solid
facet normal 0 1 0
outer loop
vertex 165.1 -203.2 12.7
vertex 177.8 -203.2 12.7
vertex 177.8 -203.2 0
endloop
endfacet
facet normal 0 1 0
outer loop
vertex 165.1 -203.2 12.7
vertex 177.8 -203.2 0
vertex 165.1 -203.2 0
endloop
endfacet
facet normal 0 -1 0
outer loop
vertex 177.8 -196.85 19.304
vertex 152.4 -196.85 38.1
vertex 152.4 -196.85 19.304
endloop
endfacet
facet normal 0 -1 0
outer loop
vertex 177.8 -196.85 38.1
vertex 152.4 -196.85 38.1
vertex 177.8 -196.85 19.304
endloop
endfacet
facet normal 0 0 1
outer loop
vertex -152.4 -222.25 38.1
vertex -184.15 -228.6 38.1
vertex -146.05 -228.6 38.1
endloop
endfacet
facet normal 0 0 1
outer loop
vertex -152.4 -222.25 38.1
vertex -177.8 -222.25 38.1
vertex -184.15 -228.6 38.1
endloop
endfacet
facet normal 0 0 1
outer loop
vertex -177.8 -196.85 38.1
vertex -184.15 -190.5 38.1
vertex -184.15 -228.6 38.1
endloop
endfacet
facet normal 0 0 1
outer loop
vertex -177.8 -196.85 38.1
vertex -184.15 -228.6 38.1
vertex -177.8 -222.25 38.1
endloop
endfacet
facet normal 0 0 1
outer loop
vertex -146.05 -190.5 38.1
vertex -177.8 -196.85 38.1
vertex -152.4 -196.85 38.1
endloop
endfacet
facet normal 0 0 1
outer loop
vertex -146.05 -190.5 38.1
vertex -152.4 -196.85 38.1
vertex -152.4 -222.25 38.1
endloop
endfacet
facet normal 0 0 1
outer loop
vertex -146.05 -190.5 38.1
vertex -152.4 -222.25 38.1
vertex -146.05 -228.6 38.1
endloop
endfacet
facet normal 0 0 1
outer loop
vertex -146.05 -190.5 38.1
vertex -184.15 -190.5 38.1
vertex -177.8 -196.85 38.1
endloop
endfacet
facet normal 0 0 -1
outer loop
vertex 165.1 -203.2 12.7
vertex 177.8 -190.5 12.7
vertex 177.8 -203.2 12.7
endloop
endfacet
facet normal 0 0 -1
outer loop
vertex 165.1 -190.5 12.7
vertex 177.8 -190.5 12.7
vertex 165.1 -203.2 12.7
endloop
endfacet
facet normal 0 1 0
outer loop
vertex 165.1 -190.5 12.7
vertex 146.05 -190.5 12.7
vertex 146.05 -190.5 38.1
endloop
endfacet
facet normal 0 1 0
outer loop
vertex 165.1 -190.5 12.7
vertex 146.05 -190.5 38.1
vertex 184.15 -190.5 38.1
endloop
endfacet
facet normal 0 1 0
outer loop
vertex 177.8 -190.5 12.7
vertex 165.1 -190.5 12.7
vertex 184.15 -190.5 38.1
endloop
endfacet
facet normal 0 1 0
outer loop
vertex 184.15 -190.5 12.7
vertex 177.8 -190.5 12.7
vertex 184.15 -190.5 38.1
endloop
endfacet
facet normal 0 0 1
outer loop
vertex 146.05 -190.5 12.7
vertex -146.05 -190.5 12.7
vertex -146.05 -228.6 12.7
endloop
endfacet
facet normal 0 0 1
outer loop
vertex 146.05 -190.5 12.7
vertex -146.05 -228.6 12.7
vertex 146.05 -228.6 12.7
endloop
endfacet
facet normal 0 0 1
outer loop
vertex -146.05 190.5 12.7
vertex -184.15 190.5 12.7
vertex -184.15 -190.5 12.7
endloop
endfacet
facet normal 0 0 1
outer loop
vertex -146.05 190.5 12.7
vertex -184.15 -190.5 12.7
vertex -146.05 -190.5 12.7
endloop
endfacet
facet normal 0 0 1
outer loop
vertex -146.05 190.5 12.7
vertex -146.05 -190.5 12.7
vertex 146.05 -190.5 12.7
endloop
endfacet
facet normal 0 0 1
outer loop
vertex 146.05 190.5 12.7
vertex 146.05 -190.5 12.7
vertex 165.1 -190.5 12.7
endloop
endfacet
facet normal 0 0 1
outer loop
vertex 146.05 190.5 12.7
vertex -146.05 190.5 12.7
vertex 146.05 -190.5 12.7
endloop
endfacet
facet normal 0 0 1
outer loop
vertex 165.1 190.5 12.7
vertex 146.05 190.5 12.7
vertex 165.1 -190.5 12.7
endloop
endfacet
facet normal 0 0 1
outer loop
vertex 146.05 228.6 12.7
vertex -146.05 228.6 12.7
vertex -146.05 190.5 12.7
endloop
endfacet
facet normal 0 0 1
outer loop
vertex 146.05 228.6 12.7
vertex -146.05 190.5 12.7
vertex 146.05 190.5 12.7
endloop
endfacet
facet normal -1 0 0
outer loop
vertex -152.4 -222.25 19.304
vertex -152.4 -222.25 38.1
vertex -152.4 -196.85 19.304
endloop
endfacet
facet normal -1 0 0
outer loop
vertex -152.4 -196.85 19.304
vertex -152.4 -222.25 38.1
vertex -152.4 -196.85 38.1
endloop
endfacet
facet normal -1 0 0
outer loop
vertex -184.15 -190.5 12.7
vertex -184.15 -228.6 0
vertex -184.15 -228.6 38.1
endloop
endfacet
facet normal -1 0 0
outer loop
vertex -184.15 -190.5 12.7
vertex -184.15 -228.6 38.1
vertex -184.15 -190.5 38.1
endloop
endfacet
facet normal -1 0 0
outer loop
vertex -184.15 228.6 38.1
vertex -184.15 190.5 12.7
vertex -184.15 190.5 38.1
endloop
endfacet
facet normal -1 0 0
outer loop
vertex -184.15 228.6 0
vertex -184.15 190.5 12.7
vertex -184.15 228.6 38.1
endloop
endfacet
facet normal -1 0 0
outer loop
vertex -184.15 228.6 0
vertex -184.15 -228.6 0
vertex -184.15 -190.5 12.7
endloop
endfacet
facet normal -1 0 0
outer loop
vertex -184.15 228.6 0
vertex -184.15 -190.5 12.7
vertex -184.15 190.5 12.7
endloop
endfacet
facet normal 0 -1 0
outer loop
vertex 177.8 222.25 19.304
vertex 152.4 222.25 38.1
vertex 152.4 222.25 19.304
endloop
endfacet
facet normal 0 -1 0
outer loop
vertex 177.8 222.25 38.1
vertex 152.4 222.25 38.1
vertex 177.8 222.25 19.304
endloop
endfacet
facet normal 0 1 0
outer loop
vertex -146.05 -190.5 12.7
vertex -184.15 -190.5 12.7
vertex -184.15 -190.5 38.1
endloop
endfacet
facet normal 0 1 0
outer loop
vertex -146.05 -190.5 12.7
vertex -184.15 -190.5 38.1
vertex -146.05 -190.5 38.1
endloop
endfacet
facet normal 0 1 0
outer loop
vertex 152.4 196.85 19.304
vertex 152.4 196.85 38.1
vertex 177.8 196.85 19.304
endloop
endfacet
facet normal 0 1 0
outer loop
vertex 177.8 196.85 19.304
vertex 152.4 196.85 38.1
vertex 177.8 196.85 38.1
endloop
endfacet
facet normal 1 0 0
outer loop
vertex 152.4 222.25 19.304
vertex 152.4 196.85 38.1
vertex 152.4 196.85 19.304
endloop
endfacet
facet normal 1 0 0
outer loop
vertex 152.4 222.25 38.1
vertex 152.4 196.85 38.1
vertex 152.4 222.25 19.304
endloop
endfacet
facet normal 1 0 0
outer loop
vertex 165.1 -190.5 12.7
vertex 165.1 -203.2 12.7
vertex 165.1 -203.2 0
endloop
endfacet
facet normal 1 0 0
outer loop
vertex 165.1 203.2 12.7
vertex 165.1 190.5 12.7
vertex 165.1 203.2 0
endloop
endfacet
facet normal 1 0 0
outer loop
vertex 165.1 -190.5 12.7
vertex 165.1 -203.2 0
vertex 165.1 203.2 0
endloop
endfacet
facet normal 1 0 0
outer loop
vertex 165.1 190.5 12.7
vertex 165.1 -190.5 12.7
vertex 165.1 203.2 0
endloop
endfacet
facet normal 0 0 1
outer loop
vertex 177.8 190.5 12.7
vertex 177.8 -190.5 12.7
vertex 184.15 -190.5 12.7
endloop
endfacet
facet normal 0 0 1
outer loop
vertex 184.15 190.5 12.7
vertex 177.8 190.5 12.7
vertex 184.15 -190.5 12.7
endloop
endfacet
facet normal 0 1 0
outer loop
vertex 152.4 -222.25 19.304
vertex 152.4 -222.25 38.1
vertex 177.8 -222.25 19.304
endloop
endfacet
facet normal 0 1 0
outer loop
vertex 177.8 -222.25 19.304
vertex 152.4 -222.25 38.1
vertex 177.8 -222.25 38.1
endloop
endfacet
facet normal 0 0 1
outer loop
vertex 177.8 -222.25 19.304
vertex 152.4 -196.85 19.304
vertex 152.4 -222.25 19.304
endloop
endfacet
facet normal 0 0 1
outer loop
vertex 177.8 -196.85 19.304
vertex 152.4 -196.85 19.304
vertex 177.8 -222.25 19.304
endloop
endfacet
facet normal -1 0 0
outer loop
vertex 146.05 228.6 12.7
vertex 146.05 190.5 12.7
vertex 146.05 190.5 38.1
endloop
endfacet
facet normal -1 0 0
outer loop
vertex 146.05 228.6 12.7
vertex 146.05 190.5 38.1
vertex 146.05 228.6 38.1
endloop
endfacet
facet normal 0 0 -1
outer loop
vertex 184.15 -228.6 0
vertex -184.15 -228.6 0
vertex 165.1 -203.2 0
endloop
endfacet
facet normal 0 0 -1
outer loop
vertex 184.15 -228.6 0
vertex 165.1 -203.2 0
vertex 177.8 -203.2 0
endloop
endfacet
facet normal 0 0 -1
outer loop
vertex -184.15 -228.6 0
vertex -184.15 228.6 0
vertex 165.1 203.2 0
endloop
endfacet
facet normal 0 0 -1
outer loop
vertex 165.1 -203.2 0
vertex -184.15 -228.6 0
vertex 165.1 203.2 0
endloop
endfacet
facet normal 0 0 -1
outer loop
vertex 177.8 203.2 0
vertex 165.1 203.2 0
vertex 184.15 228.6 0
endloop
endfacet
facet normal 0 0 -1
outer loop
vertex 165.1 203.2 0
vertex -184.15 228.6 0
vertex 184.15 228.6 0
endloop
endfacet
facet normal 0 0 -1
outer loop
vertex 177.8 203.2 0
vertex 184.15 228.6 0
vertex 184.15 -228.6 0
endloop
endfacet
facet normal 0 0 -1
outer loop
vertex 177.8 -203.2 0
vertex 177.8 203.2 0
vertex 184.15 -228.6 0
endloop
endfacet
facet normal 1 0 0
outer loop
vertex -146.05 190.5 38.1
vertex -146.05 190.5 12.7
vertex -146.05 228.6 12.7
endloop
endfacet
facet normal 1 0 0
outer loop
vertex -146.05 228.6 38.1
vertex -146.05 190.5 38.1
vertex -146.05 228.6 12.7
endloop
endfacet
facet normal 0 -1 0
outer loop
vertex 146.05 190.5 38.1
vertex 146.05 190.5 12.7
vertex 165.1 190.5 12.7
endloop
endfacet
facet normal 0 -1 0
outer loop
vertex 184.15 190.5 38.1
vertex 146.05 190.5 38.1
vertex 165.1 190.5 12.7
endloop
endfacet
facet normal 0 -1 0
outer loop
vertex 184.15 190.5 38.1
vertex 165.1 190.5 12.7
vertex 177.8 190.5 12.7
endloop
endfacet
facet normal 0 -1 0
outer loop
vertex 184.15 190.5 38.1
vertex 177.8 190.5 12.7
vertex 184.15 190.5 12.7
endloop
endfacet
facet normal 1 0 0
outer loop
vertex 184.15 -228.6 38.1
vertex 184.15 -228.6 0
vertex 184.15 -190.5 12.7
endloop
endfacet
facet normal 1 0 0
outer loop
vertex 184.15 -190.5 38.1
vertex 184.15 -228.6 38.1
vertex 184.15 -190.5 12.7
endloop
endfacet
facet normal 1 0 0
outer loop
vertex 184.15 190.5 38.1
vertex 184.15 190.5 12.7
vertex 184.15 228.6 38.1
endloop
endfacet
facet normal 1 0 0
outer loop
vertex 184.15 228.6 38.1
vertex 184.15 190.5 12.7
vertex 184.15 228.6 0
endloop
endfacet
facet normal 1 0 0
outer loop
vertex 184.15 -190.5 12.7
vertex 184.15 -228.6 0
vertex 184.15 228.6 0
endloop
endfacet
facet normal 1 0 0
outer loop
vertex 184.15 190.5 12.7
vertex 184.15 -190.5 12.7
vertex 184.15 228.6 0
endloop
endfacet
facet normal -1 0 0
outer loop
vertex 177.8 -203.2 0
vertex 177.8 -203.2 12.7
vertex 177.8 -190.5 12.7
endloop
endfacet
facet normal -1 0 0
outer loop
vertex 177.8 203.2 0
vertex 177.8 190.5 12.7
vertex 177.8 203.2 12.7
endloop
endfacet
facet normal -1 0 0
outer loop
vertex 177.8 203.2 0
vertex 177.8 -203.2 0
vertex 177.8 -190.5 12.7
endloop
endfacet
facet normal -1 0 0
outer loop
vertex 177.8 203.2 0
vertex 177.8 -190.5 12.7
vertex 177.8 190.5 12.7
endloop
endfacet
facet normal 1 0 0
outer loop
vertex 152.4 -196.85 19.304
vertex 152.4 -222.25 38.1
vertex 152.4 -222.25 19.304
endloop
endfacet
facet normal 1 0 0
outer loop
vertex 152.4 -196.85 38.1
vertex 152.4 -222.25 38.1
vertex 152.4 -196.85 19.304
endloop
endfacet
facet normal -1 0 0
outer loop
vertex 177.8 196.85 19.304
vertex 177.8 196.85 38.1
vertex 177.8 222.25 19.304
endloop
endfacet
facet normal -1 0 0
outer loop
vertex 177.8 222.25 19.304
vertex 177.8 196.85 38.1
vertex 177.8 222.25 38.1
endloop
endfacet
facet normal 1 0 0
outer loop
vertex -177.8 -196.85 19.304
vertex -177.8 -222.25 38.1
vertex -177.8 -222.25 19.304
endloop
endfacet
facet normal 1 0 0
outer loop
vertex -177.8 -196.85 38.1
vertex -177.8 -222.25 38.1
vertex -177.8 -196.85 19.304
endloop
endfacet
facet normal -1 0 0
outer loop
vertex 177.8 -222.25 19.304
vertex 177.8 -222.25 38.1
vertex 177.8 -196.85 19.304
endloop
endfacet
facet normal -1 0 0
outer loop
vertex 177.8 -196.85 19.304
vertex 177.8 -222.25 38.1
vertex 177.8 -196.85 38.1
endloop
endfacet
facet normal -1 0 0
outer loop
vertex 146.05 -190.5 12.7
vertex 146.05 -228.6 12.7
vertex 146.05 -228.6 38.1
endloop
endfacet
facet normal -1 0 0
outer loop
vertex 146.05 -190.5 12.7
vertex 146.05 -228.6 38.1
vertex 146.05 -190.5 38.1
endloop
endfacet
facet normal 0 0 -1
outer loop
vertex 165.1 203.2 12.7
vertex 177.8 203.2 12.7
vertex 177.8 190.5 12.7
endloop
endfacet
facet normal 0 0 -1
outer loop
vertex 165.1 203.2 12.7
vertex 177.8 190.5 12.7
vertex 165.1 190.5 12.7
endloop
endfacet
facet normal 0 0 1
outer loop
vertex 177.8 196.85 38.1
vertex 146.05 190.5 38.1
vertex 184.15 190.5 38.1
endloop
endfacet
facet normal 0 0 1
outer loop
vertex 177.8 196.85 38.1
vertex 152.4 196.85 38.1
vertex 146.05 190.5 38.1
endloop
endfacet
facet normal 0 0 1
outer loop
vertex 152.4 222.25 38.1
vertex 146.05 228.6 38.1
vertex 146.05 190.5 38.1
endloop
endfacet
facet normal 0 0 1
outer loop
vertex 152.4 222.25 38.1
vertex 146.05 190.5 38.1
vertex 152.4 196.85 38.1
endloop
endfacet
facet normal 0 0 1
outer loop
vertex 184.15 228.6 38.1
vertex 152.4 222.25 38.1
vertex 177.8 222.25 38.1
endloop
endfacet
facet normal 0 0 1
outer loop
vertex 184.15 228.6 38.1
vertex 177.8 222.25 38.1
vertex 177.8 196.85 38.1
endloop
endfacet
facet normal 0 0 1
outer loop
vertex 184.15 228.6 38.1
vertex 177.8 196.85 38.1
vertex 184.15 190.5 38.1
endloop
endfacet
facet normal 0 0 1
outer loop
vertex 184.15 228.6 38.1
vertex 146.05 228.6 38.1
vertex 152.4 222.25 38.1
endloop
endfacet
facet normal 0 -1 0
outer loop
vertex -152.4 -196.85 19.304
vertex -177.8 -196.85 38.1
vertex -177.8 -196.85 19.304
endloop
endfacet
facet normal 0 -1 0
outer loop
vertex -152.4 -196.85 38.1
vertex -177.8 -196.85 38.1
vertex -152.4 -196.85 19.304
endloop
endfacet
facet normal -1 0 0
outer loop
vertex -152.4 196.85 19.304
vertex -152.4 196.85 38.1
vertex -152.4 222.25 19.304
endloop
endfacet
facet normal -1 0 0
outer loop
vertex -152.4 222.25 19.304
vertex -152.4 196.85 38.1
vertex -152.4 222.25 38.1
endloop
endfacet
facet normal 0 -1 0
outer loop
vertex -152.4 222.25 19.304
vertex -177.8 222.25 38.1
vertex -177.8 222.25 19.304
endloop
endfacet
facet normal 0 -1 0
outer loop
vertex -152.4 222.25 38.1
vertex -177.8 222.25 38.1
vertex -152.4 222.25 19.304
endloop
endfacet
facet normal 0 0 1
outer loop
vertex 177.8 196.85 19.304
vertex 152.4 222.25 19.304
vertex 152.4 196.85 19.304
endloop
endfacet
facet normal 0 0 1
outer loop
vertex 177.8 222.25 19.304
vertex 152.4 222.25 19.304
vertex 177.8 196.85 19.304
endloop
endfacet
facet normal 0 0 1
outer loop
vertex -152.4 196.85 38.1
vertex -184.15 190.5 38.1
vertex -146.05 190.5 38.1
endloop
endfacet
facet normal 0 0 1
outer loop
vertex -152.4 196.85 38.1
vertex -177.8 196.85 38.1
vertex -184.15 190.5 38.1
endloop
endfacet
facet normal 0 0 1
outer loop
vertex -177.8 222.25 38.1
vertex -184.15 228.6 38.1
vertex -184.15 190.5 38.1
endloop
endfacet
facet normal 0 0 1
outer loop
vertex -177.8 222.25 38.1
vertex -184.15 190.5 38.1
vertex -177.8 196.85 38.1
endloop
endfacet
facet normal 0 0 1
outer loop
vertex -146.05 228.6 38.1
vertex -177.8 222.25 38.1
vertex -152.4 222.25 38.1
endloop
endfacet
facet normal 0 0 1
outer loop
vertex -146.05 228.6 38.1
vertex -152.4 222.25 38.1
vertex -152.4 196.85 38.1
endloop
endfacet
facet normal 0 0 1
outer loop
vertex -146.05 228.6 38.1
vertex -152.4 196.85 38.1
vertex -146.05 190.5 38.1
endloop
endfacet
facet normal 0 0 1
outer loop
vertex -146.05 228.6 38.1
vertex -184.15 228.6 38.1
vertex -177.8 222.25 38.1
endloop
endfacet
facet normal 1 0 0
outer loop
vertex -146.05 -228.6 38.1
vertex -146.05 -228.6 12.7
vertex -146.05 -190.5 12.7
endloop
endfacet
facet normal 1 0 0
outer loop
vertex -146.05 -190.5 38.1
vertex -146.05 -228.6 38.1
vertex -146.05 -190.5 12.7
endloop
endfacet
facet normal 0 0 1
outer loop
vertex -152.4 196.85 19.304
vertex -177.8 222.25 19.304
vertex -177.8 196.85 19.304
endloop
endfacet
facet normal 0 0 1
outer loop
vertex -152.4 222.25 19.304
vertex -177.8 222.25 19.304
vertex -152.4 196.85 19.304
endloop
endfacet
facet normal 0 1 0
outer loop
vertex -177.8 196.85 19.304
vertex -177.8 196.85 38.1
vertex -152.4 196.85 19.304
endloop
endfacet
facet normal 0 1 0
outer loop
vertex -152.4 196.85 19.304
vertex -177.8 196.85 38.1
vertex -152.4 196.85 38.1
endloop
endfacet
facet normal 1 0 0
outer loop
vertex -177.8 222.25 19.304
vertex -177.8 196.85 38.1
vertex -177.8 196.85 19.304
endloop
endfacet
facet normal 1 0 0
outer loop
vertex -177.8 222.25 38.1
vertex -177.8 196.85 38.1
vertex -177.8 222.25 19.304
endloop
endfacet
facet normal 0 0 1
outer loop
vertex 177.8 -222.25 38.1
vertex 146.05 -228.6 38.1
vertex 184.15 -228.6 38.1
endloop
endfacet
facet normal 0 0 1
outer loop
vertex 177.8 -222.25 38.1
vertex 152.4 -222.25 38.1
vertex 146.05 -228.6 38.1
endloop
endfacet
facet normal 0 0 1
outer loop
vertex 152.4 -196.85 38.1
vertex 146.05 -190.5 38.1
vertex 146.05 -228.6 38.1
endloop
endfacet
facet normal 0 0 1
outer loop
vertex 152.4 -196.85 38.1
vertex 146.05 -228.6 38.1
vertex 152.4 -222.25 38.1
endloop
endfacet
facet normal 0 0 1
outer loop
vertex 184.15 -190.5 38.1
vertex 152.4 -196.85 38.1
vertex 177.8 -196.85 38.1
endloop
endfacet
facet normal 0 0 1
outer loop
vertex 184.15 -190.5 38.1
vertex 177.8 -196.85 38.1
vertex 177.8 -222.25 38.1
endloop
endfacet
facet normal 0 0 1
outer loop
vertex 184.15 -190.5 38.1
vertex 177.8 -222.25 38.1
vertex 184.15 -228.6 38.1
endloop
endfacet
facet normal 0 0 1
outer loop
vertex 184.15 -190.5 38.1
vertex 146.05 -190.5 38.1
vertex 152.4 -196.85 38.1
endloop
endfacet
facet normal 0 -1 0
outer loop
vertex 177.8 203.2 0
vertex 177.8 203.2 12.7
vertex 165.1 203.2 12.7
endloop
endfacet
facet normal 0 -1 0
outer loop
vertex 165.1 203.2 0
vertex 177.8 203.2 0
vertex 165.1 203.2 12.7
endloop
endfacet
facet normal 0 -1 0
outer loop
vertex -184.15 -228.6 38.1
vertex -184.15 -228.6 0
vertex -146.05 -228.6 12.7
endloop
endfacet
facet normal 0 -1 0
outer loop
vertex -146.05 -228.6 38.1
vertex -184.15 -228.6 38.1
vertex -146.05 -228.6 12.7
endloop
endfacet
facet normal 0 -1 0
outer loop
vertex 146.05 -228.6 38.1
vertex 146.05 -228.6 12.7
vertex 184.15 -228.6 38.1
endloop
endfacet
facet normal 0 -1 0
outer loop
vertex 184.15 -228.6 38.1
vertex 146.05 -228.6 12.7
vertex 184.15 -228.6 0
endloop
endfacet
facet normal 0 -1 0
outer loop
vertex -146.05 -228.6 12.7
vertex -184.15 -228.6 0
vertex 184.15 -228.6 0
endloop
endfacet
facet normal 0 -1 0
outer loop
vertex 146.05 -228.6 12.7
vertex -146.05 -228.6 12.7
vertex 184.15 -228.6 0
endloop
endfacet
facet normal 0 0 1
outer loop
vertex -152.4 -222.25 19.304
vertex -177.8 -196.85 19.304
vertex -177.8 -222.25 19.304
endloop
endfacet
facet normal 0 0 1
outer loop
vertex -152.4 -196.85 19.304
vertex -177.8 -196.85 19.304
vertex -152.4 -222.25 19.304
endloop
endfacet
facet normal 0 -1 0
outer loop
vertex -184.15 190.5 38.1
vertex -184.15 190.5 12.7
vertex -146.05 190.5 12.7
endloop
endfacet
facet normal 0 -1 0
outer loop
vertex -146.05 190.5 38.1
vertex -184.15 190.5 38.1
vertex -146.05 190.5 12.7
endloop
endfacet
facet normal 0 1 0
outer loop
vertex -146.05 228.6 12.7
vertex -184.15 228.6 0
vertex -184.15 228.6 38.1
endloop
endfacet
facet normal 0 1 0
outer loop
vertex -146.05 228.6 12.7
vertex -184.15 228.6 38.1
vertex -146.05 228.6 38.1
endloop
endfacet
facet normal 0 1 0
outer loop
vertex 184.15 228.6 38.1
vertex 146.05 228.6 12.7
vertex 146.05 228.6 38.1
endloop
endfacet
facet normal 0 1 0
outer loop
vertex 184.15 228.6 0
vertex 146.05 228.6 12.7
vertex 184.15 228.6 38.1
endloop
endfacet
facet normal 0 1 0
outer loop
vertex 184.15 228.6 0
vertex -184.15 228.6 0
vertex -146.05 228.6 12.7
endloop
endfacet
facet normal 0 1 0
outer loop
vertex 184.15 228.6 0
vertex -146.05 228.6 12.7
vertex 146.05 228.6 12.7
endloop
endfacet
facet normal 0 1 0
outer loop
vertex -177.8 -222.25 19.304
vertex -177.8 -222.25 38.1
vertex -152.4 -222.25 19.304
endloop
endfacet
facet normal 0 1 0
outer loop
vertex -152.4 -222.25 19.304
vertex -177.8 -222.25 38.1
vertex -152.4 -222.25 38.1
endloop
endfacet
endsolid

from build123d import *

# Parameters (mm, degrees)
SKETCH1_W           = 368.3
SKETCH1_H           = 457.2
BOSS_EXTRUDE1_DEPTH = 12.7
SKETCH2_W           = 38.1
SKETCH2_H           = 38.1
BOSS_EXTRUDE2_DEPTH = 25.4
SKETCH3_W           = 25.4
SKETCH3_H           = 25.4
CUT_EXTRUDE1_DEPTH  = 18.796
SKETCH4_W           = 12.7
SKETCH4_H           = 406.4
CUT_EXTRUDE2_DEPTH  = 12.7


with BuildPart() as part:
    # Sketch1 → Boss-Extrude1 (new body)
    with BuildSketch(Plane.XY):
        Rectangle(SKETCH1_W, SKETCH1_H)
    extrude(amount=BOSS_EXTRUDE1_DEPTH)

    # Sketch2 → Boss-Extrude2 (add)
    with BuildSketch(Plane.XY.offset(12.7)):
        with Locations((-165.1, 209.55)):
            Rectangle(SKETCH2_W, SKETCH2_H)
        with Locations((-165.1, -209.55)):
            Rectangle(SKETCH2_W, SKETCH2_H)
        with Locations((165.1, -209.55)):
            Rectangle(SKETCH2_W, SKETCH2_H)
        with Locations((165.1, 209.55)):
            Rectangle(SKETCH2_W, SKETCH2_H)
    extrude(amount=BOSS_EXTRUDE2_DEPTH)

    # Sketch3 → Cut-Extrude1 (cut)
    with BuildSketch(Plane.XY.offset(38.1)):
        with Locations((-165.1, 209.55)):
            Rectangle(SKETCH3_W, SKETCH3_H)
        with Locations((165.1, -209.55)):
            Rectangle(SKETCH3_W, SKETCH3_H)
        with Locations((165.1, 209.55)):
            Rectangle(SKETCH3_W, SKETCH3_H)
        with Locations((-165.1, -209.55)):
            Rectangle(SKETCH3_W, SKETCH3_H)
    extrude(amount=-CUT_EXTRUDE1_DEPTH, mode=Mode.SUBTRACT)

    # Sketch4 → Cut-Extrude2 (cut)
    with BuildSketch(Plane(origin=(0, 0, 0), x_dir=(-1, 0, 0), z_dir=(0, 0, -1))):
        with Locations((-171.45, 0)):
            Rectangle(SKETCH4_W, SKETCH4_H)
    extrude(amount=-CUT_EXTRUDE2_DEPTH, mode=Mode.SUBTRACT)


solid = part.part
